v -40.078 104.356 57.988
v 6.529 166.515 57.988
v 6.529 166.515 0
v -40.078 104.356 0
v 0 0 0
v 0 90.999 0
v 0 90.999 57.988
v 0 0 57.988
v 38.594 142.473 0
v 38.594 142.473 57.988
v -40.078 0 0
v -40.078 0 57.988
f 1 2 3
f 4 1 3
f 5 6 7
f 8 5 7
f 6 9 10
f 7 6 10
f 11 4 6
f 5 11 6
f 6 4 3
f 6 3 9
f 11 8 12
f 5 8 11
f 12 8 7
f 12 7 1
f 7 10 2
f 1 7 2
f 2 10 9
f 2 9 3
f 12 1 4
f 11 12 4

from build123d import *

# Parameters (mm, degrees)
F0_W = 40.0777868927
F0_H = 57.9875484109


with BuildPart() as f2:
    # F2: sweep along a path in F1
    with BuildLine(Plane.XY) as f2_path:
        Line((-40.0777868927, 0), (-40.0777868927, 104.355700314))
        Line((-40.0777868927, 104.355700314), (6.5287379548, 166.5153428912))
    # F0 (on Front) → F2 (sweep)
    with BuildSketch(Plane.XZ):
        with Locations((-20.0388934463, 28.9937742054)):
            Rectangle(F0_W, F0_H)
    sweep(path=f2_path.line, transition=Transition.RIGHT)


solid = f2.part
